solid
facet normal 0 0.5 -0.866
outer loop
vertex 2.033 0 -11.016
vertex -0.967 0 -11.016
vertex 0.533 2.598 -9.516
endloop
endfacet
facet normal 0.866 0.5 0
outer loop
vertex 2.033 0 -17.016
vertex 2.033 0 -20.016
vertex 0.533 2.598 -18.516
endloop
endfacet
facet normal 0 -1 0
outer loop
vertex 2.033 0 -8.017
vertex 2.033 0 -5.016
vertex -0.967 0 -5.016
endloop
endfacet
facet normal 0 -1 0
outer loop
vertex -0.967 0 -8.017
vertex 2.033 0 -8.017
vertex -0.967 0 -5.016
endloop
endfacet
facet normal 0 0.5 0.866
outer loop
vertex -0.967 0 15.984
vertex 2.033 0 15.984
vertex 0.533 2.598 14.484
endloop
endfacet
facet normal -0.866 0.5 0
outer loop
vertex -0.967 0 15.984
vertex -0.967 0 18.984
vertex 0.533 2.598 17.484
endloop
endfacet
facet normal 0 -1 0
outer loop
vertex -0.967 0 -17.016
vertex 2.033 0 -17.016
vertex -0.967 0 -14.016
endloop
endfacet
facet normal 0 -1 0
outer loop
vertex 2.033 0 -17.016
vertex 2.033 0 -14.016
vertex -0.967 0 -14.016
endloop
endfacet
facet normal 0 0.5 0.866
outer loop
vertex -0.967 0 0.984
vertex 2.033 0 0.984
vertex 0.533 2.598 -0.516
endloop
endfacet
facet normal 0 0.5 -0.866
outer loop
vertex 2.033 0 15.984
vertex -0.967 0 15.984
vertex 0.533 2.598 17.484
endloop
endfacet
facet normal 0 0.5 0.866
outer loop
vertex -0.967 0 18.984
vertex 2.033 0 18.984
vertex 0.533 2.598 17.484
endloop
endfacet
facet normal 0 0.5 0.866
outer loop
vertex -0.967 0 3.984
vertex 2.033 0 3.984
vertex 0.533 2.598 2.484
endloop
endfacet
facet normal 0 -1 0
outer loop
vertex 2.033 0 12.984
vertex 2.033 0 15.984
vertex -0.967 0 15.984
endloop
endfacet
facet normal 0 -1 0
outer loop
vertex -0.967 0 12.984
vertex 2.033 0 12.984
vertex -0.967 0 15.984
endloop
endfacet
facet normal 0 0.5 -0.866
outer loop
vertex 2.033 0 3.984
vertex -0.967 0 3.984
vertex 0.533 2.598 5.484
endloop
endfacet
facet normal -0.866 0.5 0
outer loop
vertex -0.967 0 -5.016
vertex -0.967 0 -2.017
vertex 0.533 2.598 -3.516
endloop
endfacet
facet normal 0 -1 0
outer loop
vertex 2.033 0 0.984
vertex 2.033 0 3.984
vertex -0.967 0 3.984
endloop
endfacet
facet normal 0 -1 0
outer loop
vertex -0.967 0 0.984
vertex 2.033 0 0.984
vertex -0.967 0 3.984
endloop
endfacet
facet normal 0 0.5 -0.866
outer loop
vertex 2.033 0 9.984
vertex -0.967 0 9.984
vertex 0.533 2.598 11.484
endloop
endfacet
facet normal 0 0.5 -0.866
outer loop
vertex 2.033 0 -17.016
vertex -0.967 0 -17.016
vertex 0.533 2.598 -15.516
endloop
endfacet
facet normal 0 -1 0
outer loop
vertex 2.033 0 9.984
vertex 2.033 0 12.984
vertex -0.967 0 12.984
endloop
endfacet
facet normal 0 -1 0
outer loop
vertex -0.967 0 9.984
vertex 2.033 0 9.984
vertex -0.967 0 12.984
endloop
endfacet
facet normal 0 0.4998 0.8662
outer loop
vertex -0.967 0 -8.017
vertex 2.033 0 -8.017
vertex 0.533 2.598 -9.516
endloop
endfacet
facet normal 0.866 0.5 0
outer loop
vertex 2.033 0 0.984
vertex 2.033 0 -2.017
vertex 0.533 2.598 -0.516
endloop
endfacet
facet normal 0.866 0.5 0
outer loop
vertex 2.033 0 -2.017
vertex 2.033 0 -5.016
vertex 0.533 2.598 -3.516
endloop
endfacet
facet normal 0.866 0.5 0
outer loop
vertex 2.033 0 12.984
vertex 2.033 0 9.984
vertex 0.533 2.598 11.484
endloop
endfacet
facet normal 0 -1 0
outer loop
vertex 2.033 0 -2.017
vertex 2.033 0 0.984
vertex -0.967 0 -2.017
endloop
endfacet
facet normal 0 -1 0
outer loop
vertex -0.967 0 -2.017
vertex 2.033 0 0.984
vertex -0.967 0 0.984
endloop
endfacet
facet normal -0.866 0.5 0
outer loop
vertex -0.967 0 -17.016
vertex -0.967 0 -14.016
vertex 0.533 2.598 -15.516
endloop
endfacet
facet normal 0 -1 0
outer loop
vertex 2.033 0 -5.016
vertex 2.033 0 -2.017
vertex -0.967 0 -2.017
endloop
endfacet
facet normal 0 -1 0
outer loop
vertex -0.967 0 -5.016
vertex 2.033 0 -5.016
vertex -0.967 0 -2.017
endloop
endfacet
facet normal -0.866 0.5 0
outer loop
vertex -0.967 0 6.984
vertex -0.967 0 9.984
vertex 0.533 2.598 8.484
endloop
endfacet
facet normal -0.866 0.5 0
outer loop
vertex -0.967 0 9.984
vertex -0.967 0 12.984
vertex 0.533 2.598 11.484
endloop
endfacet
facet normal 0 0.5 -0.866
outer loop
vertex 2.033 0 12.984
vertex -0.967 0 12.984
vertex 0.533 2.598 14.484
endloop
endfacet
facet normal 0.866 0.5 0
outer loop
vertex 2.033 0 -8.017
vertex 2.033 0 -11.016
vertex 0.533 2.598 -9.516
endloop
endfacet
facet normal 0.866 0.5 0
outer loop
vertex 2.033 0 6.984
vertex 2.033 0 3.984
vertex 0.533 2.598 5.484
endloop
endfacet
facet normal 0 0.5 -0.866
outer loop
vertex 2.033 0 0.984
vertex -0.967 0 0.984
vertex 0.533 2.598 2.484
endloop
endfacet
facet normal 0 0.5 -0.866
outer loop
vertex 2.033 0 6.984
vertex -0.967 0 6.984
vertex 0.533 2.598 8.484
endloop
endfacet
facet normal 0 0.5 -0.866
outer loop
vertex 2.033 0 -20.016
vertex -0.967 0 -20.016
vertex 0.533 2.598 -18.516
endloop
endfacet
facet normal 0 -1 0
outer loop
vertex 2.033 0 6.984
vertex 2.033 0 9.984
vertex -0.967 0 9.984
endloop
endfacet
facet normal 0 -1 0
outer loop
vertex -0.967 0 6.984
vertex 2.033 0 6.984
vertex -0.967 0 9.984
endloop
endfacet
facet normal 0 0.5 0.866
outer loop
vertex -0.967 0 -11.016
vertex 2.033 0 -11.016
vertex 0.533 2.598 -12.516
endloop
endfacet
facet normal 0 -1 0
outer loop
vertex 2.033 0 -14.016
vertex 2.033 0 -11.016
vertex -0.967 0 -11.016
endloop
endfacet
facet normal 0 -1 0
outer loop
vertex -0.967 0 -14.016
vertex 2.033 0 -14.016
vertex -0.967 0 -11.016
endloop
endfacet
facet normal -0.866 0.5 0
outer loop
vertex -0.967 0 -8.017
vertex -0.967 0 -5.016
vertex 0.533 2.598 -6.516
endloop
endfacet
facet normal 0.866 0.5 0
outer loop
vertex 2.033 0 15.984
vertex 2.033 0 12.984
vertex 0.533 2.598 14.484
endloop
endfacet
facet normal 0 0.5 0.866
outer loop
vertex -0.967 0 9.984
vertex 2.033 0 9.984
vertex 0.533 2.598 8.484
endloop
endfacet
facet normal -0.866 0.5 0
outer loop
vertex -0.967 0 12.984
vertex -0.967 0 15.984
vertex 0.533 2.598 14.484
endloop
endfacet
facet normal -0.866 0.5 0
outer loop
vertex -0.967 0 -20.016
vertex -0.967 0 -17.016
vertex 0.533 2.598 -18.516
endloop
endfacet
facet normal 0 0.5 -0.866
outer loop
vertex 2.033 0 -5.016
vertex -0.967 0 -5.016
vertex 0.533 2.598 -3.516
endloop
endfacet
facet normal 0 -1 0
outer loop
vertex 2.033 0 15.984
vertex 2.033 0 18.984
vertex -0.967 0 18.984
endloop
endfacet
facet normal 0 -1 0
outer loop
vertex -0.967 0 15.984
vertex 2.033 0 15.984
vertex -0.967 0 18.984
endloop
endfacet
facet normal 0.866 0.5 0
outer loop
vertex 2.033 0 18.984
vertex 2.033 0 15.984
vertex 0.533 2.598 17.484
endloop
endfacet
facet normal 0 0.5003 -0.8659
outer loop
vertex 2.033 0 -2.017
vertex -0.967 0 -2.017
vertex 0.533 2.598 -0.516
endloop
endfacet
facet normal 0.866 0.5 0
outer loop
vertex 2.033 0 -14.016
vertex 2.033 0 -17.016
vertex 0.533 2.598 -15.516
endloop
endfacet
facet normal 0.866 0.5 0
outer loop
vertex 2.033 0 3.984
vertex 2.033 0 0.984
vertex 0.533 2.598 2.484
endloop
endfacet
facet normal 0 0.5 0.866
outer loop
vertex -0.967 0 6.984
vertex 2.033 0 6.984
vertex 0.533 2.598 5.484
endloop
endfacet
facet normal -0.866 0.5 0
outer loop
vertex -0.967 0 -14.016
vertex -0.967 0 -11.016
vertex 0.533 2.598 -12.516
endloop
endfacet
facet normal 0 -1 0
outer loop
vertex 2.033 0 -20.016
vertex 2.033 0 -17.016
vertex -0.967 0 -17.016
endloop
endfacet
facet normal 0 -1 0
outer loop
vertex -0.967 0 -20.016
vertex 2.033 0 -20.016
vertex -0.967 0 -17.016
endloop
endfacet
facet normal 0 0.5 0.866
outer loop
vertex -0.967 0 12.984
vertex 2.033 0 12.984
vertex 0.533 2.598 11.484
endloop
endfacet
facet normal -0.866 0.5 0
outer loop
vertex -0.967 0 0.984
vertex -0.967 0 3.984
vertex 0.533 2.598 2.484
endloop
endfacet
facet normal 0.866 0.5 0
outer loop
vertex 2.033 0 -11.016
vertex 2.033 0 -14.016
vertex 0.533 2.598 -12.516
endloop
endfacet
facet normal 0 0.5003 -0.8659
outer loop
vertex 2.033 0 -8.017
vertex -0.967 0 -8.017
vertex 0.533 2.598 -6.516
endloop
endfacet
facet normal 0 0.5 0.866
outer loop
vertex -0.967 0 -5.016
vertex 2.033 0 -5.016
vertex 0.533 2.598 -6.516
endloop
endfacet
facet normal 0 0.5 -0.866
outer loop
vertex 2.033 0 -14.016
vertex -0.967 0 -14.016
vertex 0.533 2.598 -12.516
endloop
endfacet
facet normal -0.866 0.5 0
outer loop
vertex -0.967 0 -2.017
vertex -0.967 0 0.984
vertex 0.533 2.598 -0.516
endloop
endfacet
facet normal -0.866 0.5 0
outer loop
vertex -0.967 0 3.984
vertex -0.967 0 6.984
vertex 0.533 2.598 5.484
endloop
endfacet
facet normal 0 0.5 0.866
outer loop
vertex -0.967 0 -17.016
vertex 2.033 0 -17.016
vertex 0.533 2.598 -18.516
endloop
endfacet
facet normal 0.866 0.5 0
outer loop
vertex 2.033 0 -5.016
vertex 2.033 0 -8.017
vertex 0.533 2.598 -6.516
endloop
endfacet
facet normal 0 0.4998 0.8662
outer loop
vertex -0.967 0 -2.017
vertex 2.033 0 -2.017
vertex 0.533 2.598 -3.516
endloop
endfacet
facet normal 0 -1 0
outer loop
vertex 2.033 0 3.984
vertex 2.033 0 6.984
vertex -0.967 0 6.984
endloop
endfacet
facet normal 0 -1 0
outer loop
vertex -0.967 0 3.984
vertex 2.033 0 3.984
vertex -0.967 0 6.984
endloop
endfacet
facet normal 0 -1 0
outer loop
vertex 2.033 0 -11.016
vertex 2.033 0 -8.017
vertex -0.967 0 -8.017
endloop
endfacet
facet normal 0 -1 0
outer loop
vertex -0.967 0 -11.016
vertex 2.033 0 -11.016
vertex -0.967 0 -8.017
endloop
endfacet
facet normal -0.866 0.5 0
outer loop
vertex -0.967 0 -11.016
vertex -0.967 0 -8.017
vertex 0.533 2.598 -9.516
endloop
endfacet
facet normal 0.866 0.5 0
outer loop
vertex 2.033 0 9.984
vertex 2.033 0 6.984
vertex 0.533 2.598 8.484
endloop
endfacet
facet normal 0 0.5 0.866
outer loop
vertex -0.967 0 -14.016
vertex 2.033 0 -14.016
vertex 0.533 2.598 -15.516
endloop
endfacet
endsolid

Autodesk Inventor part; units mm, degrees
ref_plane "YZ Plane" through (0, 0, 0) normal (1, 0, 0) x (0, 1, 0)
ref_plane "XZ Plane" through (0, 0, 0) normal (0, 1, 0) x (-1, 0, 0)
ref_plane "XY Plane" through (0, 0, 0) normal (0, 0, 1) x (1, 0, 0)
sketch "Sketch1" plane through (0, 0, 0) normal (0, 1, 0) x (-1, 0, 0)
  line L0 (-2.033, 0.9835) -> (0.967, 0.9835)
  line L1 (0.967, 0.9835) -> (0.967, -2.0165)
  line L2 (0.967, -2.0165) -> (-2.033, -2.0165)
  line L3 (-2.033, -2.0165) -> (-2.033, 0.9835)
  point P0 (0, 0)
  dimension "d0" = 3
  dimension "d1" = 3
extrude "Extrusion1" add sketch "Sketch1" along normal blind 3 draft -30
pattern_linear "Rectangular Pattern1" count 13 spacing 3 along (0, 0, 1) of "Extrusion1" first direction both ways yes
properties part number "pyr" material "Titanium"
